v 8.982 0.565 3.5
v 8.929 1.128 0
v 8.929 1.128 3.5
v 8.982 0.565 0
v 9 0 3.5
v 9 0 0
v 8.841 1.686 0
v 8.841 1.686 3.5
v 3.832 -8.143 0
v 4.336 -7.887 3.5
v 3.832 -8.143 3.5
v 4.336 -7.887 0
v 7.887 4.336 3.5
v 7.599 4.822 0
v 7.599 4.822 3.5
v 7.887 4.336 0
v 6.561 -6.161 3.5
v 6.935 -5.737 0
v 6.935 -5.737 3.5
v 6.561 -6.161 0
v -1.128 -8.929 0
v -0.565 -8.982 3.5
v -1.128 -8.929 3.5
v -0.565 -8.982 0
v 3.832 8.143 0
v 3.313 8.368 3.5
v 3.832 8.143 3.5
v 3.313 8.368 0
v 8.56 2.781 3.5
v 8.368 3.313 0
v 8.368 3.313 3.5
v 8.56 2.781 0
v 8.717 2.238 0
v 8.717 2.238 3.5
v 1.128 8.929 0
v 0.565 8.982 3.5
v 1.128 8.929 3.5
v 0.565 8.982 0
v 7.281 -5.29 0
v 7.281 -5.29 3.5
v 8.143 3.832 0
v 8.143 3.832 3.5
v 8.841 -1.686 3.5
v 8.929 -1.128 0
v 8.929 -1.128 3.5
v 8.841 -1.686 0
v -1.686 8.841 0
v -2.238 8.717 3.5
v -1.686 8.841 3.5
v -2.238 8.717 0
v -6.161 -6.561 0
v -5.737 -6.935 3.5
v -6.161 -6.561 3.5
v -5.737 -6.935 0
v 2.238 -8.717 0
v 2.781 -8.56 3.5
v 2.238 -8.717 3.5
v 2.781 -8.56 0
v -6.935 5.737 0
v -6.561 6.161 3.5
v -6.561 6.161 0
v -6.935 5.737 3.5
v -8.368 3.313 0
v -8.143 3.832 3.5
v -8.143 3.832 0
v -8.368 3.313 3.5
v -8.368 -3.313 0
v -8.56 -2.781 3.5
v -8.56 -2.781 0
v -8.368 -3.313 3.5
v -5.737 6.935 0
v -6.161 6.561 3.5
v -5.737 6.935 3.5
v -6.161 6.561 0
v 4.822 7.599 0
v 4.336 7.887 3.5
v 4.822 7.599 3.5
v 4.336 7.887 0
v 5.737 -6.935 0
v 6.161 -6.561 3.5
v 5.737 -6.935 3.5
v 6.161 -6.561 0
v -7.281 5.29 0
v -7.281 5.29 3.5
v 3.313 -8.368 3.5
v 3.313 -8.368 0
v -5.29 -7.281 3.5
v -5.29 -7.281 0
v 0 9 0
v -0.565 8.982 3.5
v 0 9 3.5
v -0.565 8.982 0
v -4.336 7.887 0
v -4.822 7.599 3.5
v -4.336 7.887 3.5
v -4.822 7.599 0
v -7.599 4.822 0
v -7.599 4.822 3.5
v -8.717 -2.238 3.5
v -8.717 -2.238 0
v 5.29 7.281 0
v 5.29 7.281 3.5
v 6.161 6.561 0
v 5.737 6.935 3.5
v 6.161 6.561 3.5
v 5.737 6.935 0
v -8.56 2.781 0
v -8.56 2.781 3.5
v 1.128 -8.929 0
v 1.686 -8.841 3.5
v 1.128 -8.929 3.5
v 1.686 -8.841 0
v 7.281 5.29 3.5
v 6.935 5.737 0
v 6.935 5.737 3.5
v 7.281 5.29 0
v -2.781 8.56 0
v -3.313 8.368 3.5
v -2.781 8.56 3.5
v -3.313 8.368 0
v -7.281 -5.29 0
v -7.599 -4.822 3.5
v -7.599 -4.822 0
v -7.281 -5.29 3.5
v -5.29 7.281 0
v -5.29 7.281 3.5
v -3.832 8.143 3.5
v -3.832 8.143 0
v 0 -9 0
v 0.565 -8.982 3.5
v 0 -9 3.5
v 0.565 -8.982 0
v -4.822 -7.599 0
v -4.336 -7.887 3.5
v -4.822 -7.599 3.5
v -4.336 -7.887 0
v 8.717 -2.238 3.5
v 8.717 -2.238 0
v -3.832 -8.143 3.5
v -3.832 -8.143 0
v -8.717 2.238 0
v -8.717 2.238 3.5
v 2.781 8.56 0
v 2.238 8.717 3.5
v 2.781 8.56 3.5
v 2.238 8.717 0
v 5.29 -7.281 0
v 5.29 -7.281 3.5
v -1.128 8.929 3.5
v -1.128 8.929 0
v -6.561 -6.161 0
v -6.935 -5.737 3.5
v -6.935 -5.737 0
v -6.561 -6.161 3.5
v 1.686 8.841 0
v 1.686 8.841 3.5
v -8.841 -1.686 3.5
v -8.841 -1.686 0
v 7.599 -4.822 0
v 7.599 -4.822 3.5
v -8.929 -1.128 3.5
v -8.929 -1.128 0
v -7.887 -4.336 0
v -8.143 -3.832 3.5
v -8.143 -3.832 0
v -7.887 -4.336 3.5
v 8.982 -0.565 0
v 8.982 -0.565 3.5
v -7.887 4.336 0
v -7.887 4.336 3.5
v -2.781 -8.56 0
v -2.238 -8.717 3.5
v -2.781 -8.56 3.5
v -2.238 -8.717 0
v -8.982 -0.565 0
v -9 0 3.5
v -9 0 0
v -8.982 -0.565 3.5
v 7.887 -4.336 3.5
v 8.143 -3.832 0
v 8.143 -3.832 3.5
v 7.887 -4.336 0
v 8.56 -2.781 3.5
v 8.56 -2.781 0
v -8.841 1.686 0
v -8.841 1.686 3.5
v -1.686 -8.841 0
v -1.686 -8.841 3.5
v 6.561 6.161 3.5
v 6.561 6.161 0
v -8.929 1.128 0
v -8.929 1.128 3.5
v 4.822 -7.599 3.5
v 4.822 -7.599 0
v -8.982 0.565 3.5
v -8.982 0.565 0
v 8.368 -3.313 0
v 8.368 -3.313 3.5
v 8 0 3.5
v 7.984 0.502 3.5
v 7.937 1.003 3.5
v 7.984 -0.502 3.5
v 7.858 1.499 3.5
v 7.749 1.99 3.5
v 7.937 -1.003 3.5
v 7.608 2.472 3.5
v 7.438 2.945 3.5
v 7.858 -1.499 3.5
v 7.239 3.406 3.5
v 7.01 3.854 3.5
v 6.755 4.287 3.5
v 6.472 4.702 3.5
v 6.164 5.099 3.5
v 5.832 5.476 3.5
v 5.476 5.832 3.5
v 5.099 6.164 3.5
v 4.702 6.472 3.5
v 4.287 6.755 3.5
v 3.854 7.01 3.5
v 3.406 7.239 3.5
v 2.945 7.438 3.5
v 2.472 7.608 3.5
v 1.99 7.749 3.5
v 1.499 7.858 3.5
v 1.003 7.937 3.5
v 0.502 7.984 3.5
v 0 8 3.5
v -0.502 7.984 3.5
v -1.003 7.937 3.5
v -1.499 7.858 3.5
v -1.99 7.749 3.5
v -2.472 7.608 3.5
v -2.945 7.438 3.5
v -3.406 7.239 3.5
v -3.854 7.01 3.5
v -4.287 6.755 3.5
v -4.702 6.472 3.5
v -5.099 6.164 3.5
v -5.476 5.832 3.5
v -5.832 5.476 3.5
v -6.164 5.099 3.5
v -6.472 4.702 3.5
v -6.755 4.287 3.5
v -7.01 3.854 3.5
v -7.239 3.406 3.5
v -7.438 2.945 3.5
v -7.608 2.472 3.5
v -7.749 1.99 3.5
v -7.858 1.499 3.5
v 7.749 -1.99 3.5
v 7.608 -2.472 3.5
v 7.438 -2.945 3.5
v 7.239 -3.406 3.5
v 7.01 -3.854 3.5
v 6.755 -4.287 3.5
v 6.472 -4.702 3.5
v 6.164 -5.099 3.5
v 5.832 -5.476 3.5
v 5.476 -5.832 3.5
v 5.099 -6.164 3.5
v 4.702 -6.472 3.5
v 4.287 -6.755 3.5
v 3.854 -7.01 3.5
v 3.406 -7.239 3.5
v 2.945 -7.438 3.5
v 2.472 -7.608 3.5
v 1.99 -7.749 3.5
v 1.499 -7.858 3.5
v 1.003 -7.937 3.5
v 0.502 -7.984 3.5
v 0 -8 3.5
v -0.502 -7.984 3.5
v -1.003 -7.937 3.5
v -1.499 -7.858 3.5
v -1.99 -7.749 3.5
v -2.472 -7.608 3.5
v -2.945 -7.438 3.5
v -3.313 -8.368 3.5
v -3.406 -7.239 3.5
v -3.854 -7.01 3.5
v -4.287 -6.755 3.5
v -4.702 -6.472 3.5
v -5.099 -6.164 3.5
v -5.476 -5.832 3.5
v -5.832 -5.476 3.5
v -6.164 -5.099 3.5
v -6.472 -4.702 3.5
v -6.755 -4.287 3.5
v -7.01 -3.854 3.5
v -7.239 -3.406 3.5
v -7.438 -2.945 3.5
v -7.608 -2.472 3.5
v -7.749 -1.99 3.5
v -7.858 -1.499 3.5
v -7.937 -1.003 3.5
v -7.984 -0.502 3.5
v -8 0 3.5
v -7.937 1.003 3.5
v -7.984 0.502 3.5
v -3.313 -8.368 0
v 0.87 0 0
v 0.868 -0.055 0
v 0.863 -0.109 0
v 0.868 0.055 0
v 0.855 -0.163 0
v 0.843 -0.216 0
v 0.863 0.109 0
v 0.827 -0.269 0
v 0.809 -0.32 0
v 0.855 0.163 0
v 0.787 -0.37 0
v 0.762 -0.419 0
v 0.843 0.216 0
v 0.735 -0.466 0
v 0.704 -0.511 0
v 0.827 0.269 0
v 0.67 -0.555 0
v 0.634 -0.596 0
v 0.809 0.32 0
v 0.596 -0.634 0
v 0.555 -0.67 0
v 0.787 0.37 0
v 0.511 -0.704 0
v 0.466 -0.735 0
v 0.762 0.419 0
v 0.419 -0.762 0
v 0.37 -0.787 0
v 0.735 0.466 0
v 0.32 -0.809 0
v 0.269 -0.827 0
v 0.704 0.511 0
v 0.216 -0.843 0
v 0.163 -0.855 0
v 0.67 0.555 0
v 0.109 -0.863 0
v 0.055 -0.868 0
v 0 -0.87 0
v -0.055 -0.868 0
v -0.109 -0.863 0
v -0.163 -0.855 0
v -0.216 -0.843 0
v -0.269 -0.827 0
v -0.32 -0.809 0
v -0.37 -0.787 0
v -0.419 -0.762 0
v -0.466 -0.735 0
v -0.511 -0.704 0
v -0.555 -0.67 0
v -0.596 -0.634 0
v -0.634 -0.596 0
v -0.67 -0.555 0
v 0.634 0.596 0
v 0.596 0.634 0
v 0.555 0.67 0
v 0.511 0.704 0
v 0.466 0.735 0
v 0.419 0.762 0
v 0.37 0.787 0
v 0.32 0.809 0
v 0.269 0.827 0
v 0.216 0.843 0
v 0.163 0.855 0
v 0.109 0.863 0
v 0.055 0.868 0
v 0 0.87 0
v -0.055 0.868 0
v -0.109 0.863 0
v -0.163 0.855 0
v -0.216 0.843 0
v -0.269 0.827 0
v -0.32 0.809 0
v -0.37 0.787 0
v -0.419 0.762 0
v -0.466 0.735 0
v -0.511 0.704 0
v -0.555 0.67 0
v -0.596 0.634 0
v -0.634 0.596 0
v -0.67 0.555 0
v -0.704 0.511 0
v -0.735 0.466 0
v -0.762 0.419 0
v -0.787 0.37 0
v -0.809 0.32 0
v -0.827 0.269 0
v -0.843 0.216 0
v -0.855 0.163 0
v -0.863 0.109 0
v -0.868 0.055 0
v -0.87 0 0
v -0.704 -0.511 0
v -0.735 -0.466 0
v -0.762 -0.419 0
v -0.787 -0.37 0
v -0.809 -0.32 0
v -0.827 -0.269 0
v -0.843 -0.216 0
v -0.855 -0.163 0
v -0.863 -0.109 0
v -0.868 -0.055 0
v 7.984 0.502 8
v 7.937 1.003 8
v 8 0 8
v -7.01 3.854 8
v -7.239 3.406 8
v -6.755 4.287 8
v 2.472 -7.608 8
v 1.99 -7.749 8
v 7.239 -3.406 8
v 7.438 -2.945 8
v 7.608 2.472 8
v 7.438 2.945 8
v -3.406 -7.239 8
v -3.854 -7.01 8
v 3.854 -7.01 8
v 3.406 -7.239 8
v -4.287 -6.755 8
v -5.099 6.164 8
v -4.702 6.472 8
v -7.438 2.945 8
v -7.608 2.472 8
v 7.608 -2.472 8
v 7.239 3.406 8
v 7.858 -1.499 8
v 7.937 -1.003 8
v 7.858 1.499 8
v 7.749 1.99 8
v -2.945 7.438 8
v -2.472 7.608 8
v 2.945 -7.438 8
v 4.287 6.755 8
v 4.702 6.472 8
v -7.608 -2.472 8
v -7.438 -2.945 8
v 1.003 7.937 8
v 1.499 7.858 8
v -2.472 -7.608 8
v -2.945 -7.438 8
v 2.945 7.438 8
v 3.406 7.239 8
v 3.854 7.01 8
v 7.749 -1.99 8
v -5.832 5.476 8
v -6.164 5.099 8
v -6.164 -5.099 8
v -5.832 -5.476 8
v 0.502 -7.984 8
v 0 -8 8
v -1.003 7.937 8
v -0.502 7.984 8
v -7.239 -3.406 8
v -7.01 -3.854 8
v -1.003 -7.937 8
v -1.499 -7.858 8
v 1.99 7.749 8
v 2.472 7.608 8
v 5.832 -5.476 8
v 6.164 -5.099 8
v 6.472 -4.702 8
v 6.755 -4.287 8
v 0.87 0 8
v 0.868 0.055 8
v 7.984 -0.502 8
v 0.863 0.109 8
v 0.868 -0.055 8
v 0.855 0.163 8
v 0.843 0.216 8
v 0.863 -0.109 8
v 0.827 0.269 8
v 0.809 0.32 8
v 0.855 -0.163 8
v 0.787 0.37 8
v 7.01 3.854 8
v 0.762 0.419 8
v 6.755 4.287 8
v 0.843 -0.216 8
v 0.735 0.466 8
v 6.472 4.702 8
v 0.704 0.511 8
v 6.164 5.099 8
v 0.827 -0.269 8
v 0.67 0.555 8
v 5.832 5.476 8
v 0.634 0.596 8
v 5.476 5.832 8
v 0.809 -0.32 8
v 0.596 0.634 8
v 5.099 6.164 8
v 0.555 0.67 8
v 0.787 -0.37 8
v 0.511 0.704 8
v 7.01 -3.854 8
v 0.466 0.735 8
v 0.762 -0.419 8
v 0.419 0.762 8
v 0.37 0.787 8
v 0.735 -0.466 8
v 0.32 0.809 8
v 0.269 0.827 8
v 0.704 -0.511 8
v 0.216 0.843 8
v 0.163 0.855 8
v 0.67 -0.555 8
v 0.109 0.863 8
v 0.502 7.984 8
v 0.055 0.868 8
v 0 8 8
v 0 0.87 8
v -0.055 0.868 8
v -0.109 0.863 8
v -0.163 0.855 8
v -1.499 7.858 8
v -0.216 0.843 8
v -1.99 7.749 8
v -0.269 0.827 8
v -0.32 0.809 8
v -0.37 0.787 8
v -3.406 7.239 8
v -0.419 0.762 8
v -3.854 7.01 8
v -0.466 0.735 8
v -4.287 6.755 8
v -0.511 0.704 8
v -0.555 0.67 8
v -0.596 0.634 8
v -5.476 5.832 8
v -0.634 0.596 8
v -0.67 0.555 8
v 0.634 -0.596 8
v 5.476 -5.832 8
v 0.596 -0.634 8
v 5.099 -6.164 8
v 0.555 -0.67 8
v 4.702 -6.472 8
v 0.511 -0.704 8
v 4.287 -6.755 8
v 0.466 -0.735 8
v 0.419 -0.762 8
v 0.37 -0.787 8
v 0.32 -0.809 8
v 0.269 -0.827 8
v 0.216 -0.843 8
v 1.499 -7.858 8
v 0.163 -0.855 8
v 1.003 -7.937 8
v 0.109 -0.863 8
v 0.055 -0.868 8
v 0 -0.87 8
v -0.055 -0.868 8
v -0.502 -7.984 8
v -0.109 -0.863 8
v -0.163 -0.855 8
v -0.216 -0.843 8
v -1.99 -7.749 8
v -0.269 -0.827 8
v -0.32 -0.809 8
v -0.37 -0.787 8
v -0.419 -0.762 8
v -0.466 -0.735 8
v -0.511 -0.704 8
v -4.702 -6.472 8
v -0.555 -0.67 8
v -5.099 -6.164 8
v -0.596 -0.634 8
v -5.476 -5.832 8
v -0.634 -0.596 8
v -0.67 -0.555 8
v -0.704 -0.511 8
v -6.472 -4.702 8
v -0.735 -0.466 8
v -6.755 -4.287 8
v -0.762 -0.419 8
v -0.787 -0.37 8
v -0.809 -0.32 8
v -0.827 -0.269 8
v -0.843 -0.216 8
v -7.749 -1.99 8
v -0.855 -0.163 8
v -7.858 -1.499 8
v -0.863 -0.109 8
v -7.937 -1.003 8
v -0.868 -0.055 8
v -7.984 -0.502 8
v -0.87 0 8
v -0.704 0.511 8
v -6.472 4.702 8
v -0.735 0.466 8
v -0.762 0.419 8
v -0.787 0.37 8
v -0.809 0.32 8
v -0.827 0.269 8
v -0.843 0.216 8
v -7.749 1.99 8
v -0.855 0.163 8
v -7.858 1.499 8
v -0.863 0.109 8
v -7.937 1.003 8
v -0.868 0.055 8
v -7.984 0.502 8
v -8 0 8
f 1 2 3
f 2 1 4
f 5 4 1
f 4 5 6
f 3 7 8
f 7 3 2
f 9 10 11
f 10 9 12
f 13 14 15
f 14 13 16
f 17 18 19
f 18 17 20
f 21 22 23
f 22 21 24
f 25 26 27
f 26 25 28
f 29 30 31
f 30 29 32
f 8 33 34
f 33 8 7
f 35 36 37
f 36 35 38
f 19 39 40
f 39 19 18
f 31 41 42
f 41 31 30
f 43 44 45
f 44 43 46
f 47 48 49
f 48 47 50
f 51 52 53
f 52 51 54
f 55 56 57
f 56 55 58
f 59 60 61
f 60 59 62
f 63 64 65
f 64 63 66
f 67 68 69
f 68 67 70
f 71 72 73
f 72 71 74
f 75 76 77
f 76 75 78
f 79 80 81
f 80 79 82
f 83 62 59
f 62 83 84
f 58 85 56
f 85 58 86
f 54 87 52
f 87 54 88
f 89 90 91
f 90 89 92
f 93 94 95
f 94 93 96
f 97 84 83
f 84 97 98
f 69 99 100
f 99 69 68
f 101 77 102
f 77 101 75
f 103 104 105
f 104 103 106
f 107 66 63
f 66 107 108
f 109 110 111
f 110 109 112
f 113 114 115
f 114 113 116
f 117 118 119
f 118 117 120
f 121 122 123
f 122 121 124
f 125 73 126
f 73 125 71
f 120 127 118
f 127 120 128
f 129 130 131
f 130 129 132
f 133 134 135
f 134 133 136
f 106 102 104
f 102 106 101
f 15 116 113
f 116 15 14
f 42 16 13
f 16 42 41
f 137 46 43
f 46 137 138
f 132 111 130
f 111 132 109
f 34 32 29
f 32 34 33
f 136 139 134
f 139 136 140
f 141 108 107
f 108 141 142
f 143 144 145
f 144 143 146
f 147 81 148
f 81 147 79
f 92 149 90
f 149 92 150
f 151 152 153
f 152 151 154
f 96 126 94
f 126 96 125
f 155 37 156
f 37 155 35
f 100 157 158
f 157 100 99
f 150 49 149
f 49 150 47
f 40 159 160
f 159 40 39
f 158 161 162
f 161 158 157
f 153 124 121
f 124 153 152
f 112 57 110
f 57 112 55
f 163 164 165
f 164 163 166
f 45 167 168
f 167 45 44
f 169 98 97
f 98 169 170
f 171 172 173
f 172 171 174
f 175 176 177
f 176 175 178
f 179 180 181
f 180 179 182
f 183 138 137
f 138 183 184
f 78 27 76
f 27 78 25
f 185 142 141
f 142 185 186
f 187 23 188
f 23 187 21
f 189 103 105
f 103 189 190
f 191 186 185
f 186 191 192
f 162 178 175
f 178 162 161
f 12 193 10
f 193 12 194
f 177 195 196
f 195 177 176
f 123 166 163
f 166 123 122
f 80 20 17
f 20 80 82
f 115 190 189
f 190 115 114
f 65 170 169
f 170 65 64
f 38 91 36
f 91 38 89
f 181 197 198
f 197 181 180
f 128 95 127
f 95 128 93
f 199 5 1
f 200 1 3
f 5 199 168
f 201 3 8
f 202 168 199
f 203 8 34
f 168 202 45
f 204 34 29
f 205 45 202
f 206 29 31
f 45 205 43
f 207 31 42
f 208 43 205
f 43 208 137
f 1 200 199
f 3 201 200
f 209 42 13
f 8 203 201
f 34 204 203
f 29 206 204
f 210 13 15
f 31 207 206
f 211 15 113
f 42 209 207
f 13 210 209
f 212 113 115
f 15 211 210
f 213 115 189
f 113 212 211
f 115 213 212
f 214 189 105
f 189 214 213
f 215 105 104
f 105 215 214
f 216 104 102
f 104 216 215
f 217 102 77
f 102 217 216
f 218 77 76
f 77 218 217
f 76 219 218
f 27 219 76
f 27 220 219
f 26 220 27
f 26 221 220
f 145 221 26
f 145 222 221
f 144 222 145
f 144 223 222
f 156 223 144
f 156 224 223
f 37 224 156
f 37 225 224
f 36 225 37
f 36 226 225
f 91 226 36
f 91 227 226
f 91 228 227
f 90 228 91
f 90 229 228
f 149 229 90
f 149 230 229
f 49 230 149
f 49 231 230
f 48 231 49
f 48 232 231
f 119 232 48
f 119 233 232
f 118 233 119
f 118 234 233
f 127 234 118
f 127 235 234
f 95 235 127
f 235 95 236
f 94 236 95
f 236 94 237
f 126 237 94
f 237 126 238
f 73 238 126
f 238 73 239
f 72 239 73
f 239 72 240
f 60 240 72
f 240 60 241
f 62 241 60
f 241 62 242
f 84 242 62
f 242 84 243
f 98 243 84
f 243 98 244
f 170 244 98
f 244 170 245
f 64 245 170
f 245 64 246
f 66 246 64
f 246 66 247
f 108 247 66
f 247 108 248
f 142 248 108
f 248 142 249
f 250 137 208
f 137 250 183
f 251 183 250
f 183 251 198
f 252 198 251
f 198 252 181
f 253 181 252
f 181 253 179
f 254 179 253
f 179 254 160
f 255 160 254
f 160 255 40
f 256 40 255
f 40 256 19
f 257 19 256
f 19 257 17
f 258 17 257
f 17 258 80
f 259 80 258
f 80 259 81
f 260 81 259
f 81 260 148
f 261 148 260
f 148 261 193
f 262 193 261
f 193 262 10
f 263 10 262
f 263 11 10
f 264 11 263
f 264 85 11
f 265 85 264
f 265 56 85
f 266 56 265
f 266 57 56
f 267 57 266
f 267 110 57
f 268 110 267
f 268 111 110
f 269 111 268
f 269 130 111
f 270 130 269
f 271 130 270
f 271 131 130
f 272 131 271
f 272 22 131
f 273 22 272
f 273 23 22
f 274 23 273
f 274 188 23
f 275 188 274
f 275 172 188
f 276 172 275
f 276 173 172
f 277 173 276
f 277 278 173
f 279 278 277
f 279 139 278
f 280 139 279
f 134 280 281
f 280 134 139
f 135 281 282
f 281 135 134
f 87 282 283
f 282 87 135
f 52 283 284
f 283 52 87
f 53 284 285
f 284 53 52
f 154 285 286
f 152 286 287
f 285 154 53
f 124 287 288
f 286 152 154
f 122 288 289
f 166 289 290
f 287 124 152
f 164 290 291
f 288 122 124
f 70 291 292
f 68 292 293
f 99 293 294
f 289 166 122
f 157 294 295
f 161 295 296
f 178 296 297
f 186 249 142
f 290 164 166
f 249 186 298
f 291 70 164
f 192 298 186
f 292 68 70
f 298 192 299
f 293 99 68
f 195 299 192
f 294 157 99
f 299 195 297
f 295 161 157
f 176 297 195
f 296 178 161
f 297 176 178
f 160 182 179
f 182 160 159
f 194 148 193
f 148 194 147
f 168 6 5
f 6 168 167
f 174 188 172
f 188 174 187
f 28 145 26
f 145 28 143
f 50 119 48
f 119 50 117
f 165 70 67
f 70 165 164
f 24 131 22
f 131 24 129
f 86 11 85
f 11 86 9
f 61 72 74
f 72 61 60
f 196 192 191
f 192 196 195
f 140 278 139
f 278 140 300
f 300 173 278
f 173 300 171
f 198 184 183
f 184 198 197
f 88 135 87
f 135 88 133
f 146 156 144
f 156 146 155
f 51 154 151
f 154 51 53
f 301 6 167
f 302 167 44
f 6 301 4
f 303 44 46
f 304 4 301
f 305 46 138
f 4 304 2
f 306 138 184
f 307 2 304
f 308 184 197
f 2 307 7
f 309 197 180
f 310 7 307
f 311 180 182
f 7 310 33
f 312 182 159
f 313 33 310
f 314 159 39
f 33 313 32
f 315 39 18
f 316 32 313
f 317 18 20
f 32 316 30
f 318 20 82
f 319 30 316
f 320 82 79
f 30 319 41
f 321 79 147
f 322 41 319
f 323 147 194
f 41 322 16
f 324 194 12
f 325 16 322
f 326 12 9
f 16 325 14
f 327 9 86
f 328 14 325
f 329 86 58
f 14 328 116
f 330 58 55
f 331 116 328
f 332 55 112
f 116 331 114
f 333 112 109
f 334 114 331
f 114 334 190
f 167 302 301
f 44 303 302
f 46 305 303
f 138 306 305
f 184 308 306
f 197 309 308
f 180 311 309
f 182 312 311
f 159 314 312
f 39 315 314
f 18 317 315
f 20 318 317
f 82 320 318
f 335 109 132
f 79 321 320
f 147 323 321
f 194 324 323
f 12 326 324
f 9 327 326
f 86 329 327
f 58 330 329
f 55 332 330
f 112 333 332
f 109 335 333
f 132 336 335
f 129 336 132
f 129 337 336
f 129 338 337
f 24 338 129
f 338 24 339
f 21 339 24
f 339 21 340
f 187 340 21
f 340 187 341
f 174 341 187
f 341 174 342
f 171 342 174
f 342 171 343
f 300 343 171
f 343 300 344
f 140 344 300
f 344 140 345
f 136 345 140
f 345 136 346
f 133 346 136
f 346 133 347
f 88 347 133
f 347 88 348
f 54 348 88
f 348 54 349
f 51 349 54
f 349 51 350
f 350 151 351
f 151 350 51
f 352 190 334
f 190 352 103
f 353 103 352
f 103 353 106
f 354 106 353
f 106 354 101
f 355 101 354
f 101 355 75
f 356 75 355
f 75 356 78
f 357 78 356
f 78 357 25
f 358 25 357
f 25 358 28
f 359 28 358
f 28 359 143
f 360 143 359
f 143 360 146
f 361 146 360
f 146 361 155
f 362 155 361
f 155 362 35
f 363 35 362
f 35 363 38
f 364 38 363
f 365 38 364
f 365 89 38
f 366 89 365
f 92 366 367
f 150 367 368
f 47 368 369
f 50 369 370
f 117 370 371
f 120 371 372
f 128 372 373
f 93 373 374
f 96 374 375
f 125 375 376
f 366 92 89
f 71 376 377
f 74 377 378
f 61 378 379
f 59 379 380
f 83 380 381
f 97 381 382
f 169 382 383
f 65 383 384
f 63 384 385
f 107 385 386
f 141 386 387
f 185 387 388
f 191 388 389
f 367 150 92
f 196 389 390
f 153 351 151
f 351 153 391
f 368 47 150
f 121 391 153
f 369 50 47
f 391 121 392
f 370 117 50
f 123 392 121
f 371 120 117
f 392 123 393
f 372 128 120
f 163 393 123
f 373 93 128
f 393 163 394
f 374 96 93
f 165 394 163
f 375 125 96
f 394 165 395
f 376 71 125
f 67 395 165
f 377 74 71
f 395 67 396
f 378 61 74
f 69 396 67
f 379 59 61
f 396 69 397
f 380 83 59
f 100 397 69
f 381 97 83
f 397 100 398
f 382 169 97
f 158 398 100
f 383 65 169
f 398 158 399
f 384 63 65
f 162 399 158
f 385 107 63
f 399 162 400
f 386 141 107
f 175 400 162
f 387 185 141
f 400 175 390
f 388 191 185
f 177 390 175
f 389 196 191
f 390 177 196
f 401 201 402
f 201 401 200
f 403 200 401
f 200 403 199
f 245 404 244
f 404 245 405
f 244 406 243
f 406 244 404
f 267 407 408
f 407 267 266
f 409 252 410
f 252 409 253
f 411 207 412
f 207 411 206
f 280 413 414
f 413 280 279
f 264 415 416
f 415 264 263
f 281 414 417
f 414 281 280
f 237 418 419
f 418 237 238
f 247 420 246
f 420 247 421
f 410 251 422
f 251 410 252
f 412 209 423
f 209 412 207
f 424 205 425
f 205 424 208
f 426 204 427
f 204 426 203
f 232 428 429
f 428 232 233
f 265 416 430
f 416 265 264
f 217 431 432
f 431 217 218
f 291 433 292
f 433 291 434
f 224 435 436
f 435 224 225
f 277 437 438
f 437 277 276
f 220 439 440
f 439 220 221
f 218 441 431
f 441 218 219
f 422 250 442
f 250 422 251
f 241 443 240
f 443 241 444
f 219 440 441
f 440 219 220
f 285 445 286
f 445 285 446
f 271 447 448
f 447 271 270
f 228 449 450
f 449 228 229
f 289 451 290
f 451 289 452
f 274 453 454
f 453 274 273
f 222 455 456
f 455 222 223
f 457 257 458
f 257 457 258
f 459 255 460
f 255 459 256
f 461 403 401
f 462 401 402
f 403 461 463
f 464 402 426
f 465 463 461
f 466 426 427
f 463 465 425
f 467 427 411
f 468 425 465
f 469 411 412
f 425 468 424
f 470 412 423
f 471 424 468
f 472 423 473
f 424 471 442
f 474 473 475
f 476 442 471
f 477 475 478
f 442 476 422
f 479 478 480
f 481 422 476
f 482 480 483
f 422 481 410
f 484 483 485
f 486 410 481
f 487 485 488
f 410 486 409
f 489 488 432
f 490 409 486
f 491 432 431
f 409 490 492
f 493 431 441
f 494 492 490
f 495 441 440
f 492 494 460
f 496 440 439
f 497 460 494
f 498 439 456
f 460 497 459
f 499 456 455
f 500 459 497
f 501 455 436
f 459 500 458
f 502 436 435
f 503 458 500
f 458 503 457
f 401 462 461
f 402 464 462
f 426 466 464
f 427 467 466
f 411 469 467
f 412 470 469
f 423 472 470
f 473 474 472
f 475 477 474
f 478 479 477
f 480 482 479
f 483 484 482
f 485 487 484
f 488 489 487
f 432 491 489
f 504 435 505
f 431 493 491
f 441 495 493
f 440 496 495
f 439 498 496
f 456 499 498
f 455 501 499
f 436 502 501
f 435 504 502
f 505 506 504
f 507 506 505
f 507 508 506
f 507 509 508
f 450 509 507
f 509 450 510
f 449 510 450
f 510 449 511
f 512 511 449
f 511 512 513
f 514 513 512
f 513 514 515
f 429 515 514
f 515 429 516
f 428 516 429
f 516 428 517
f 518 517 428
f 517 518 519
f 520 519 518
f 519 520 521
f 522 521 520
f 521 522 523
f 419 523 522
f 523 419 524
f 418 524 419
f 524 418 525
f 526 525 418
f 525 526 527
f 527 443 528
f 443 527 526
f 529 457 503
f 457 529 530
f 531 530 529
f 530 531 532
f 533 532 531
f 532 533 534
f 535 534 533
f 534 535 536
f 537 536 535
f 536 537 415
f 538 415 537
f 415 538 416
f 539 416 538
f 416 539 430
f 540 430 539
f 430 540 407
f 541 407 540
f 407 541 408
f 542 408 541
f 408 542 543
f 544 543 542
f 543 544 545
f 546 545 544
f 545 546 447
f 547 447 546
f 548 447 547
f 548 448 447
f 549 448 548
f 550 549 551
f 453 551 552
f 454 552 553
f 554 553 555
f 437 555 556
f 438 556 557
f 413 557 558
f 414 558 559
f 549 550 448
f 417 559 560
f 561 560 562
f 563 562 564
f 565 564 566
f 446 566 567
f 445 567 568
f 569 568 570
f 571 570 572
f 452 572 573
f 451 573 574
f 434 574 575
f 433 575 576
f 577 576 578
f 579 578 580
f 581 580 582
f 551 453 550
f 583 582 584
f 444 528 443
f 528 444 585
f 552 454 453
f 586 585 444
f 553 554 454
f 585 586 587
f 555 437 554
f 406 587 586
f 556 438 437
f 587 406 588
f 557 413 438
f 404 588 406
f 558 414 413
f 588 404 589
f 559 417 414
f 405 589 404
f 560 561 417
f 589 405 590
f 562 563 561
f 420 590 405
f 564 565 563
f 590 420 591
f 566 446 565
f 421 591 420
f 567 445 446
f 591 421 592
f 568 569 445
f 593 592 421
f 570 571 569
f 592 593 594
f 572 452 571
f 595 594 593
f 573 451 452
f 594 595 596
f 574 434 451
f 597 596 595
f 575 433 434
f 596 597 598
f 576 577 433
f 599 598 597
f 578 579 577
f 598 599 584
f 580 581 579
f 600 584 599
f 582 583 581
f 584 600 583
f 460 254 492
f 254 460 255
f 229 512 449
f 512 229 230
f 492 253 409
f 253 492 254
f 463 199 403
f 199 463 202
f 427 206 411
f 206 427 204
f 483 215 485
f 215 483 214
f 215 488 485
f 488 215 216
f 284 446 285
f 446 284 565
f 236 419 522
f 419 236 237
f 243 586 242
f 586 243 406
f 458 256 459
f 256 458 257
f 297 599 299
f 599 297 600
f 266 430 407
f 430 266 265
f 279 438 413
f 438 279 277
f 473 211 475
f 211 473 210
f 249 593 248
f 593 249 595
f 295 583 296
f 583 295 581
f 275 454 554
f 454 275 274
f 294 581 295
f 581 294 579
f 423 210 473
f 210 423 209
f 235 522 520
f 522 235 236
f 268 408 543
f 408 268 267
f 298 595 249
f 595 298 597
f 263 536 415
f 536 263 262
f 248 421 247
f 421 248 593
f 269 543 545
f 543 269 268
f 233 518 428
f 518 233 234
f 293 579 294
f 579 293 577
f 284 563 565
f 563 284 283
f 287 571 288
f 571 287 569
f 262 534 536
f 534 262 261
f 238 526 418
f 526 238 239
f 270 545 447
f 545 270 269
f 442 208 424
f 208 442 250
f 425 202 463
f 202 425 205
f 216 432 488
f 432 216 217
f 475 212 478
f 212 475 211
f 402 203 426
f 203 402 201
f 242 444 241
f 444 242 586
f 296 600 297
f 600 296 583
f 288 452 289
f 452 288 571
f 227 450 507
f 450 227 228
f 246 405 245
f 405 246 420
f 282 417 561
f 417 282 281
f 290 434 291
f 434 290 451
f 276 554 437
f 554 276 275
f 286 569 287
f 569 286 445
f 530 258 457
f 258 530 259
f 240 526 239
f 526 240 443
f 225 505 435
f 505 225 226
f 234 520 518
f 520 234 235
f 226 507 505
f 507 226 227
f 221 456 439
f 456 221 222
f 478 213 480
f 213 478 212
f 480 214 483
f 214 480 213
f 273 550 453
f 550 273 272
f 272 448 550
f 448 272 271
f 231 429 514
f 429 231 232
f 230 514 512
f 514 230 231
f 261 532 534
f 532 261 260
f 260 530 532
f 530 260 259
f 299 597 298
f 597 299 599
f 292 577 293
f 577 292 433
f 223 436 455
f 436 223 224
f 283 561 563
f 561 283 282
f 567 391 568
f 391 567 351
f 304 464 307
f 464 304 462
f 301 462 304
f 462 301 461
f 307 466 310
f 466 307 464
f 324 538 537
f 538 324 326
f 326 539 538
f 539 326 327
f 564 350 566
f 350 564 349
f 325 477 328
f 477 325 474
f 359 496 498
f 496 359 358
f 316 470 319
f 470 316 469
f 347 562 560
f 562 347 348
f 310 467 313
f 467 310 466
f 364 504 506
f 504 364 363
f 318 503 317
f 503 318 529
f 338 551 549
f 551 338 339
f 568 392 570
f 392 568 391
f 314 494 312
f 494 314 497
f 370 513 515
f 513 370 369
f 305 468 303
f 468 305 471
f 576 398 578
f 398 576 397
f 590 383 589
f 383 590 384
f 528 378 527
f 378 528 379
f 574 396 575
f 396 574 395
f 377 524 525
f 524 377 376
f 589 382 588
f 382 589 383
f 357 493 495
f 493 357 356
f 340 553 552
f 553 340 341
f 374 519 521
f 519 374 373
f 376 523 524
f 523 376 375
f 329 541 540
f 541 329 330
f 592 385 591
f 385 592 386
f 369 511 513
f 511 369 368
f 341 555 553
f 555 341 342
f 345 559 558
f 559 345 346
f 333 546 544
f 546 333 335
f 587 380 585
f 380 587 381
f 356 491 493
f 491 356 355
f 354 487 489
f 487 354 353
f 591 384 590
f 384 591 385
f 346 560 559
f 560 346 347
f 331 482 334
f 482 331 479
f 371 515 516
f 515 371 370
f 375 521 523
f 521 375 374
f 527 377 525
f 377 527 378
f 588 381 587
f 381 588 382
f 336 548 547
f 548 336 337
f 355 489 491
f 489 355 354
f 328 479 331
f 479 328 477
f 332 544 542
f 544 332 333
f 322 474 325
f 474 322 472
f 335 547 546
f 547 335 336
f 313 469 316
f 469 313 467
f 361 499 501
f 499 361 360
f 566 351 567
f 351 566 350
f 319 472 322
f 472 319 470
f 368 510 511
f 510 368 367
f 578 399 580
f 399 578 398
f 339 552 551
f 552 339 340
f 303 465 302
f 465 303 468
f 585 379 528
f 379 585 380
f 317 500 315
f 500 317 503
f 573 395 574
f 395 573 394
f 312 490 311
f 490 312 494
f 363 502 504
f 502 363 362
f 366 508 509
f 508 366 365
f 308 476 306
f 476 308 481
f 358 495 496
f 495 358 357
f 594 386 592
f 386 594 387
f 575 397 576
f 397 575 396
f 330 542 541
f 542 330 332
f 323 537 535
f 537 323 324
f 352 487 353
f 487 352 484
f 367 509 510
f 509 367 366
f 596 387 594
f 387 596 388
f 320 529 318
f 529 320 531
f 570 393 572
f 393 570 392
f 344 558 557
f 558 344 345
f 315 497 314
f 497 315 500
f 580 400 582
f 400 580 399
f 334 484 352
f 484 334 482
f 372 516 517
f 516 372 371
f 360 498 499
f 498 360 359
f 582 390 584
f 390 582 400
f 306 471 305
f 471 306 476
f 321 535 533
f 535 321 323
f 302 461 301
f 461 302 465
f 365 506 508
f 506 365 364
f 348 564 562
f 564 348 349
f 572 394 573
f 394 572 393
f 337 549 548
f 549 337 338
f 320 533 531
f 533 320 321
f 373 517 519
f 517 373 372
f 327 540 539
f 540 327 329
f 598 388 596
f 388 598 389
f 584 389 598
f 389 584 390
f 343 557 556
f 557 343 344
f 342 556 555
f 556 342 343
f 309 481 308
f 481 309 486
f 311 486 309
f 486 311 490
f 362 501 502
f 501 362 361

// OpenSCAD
// file: myTools.scad
module tube (r = 0, d = 0, l = 0, 
            thick = 0, 
            bCentered = true, 
            taper_pct = 0, 
            circlip = false) // r=radius d=dia l=length 
{
    assert( r != 0 || d != 0, "specify one of radius or diameter");
    assert( l != 0 , "tube: need length 'l' to be non zero");
    assert( thick != 0, "wall thickness cannot be zero");

    punch = $preview ? .2 : 0; // stop funny view artifact

    dia = r ? r * 2 : d;

    od = ((thick > 0) ? dia + thick * 2 : dia);
    id = (thick > 0) ? dia             : dia  + thick *2; 

    
    
    if (thick > 0)
        echo ("tube\tMIN id = ", id, "od = ", od, "wall = ", thick, "center= ", bCentered);
    else
        echo ("tube\tMAX od = ", od, "id = ", id, "wall = ", thick, "center= ", bCentered);

    echo ("tube\tHeigth = ", l);
        
    if (taper_pct != 0)
    {
        echo ("tube\t*** OD expanded by ", taper_pct, "%, : bottom od = ", od * (1. +taper_pct/100), "top od = ", od);
    }
    
    assert(dia || dia < 0, "tube : missing r or d ");
    
    // if taper_pct specified, the base will always be closest to 0,0,0
    translate([ 0, 0, taper_pct == 0 ? 0: bCentered ? l/2:l  ])
    rotate([0, taper_pct == 0 ? 0 : 180, 0 ])

    difference()
    {
        // make a reese's cup
        {
            color("YELLOW", .3)
            linear_extrude(height= l, scale = 1 + taper_pct/100)
                difference()
                {
                    circle(d = od);
                    circle(d = .5);
                }
        }
    
     // hollow out reessed cup
     color("GREEN")
     translate([0, 0, -punch/2])
     linear_extrude(height= l+ punch*2, $fn=100)
     {
        circle(d = id);
        if (circlip) #square([1 + punch, od ]);
     }
    
    }
}
//==============================================================================
        
module abox (dims, 
            thick = 0, 
            bCentered = true, 
            round_out = 0, 
            round_in = 0, 
            bSolid = false,
            bHollow = false,
            elevator = 0)   // move bottom up by X
{
    punch = $preview ? .1 : 0; // stop funny view artifact
    
    assert(thick != 0, "Thick must be specified. +=outside dim, -= inside dims");
    assert(dims.z > thick, "wall thickness too large for depth of box");

    wall2 = abs(thick) * 2; // 2 walls in each direction
    wall = wall2 / 2;
    
    // box either grows inward (thick < 0) or outward (thick > 0)  from dims
    fat = dims + [ wall2, wall2, wall];
    thin = dims - [ wall2, wall2, wall];
    
    offset = (thick > 0 && bCentered == false) ? wall : 0;
    
    //echo ("abox : adjusting x,y,z by ", offset, " to move origin from  center to 0,0,0");
    translate( [ bCentered ? 0 : dims.x /2 + offset, bCentered ? 0 : dims.y /2 + offset, bCentered ? 0 : dims.z /2 + offset/2]) 
    {
        if (thick > 0)
        {   
            // wall grows outwards from users dim
            echo ("making a box, MAX INSIDE dim = ", dims);
            echo ("   wall=", thick, " mm");
            echo ("   calc outside = ", fat, " mm");
        }
        else
        {
            // wall grows inward from users dime
            echo ("making a box, MAX OUTSIDE dim = ", dims);
            echo ("    wall=", thick, "mm");
            echo ("    calc inside = ", thin, " mm");
        }
        echo (" ");
        
        // linear extrude alway works in the positive x/y plane an goes upward.
        // after calc, re-center about 0,0,0 where a bCentered cube would be
        
        translate([ 0, 0, thick > 0  ? -fat.z/2 : -dims.z/2 ])
        difference()
        {
            echo ("round_out = ", round_out);

            // MAKE SOLID BOX --------------------------------------
            router_outside = round_out ? round_out : 0;
            x = thick > 0  ? fat.x - router_outside : dims.x - router_outside;
            y = thick > 0  ? fat.y - router_outside : dims.y - router_outside;


            // MAKE PUCHNED INSIDE
            // using 'offset' it will add r on all dimensions, then round., 
            // so now you have fatter perimeter than you started with :(
            //  but at least the corners are round.
            
            // Compensate by shrinking dimension by r, 
            // and then by calling offset, offset will then add it back

            color("YELLOW", .2)

            // ready height 
            linear_extrude(thick > 0  ? fat.z : dims.z)
            if (round_out)
            {
                offset( r= round_out, $fn=30)
                square( [x - router_outside, y - router_outside], true);
            }
            else
            {
                // no rounding on outside dims.
                square( [x, y], true);
            }
            // time to punch out the inside if requested.
            if (bSolid == false)
            {
                hollow_offset = bHollow ? fat.z/2 + .2  : dims.z/2 +.2;
                // punching out inside. its either dims or thin.
                router_inside = round_in;
                echo ("round_in = ", router_inside);
                xi = thick > 0  ? dims.x  : thin.x;
                yi = thick > 0  ? dims.y : thin.y ;

                color("GREEN")

                // move 'punch' up if you need a bottom else zero (hollowed out)

                translate([ 0,0, bHollow ? -.1 : wall + elevator]) 
                linear_extrude(thick > 0  ? fat.z - wall  + hollow_offset : dims.z - wall + hollow_offset)
                //#linear_extrude(fat.z - wall  + hollow_offset)
                
                if (round_in) 
                {
                    offset( r= round_in, $fn=30)
                    square( [ xi - round_in*2, yi - round_in*2], true);
                }
                else
                    square( [ xi, yi], true);
            }
        }
    }
 }
//-----------------------------------------------------
module abox_punch (dims, 
            thick = 0, 
            bCentered = true, 
            round_out = 0, 
            round_in = 0, 
            bSolid = false,
            bHollow = false,
            elevator = 0)   // move bottom up by X
{
    // move bottom down by wall thickness to blow out bottom
    abox(dims, thick, bCentered,
         round_out, round_in, bSolid = false, 
         bHollow=true, elevator = -thick);
}



// 50x25x10 box walls grow inward (-2). on center origin midpoint
// rounded outside (default), sharp corner inside(default), bCentered about 0,0,0
//color("GREEN", .9)
//abox([50,25, 10], -2, true); 


// 50x25x10 box walls grow outward (+2). on center origin midpoint
// sharp outside corners, rounded inside corners. Sit on x,y plane
color("BLUE", .9)
abox([50,20, 10], +2, round_in=2, bCentered = false);  // 50x25x10 box inside dim origin has 0,0


// 50x25x10 box walls grow inward (-2). on center origin midpoint
// sharp corners inside and out. sits on x,y plane
color("GREY", .9)//
translate([ 55, 0, 0])      
abox([50,20, 10], +2, round_out=3, false);

color("PINK", .9)//
translate([ 55 * 2, 0, 0])      
abox_punch([50,20, 10], +2, round_out=3, false);

color("GREEN", .9)//
translate([ 55 * 3, 0, 0])      
abox_punch([50,20, 10], +2, round_in=2, false);


color("CYAN", .9)//
translate([ 55 * 4, 0, 0])      
abox_punch([50,20, 10], +2, round_in=2, round_out=2, false);


/*
color("GREEN", .9)//
translate([ 140, 10, -10])      
abox([86.66, 56.865, 5], 3, bHollow = true, bCentered = false); 
*/

/*
// 50x25x10 box walls grow inward (-2). on center origin midpoint
// round corners outside and SOLID
color("BLUE", .9)//
translate([ 55, 0, 0])      
abox([50,25, 10], +2, round_out=2, round_in=0, false, bSolid = true); // 50x25x10 box outside dim origin is 0,0
*/

//translate ([-30,-30, 0])
{
/*
    // tube outer dia  20, inner dia = (20 - 8)
    color("PINK")
    tube (d = 20, l = 20, thick = -8, bCentered = false);

    // tube, inner dia = (2* 10), outer dia = ((2*10) + 2) 
    color("PURPLE", .3)
    tube (r = 10, l = 20, thick = +2, bCentered= true);
*/
/*
    tube (d = 60, l = 20, thick = -6, bCentered = false);

    translate([0, 0, 50])
    tube (d = 60, l = 20, thick = -6, bCentered = false, taper_pct = 20, circlip = true);
    //color("GREEN")
    //tube (d = 20, l = 20, thick = -2, bCentered = false, taper = 10, circlip = true);
*/

}
// main file
use <myTools.scad>
// MAKE A WALL PLUG for NAIL for epaper

MM=25.43;
LCD_WHITE_BOARDER = 3.5;

$fn=100;
difference()
{
    union()
    {
        color("GREEN")
        cylinder(d=20 - 2, h=LCD_WHITE_BOARDER);
        
        color("PINK")
        translate([0, 0, LCD_WHITE_BOARDER])
        cylinder(d=20 - 4, h=LCD_WHITE_BOARDER+1);
    }
    
    cylinder(d=1.74, h=LCD_WHITE_BOARDER *2 +1);
}

// REFERENCE
/*
 
bMakeBack = true; //true;


TWEAK=.8;

epaper_length = 170.20 + TWEAK; //170.20 on spec
epaper_width = 111.20 + TWEAK ; // 111.2 on spec
epaper_thick = 1.2 + TWEAK;     // 1.2 +/- .1 on spec

LCD_WHITE_HEIGHT = 111.20 - 97.92 - 3.49; 
LCD_WHITE_WIDTH = 163.2;     



outside_height = 10;
BEZEL_THICK = 3;
BOTTOM_WALL_REDUCTION = 2;

flex_cable_wide = epaper_length - 2 * 74 ;
flex_cable_offset = 78.5 - 5;
MYLAR_FEED = [flex_cable_wide, 2, 15 ];

if (bMakeBack)
{
    rotate([0, 0, 0 ])
    translate([ BEZEL_THICK, BEZEL_THICK, 20])
    {
        difference()
        {
            // don't need box to have max emptyness, raise floor via elevator = 3
            color("CYAN")
            abox([epaper_length - TWEAK, 
                  epaper_width - TWEAK, 
                  outside_height * 1.2 ], 
                  thick = -LCD_WHITE_BOARDER, 
                  bHollow = false, 
                  bCentered = false);

            translate([ flex_cable_offset,  
                        BEZEL_THICK/2,
                        LCD_WHITE_BOARDER])
            color("GREEN")
            #cube(MYLAR_FEED , center = false);
            
            translate([ epaper_length/2,  
                epaper_width - 25,
                -LCD_WHITE_BOARDER])
                
                color("GREEN")
                #cylinder(d=20, h=10);

        }
    }
}
*/
